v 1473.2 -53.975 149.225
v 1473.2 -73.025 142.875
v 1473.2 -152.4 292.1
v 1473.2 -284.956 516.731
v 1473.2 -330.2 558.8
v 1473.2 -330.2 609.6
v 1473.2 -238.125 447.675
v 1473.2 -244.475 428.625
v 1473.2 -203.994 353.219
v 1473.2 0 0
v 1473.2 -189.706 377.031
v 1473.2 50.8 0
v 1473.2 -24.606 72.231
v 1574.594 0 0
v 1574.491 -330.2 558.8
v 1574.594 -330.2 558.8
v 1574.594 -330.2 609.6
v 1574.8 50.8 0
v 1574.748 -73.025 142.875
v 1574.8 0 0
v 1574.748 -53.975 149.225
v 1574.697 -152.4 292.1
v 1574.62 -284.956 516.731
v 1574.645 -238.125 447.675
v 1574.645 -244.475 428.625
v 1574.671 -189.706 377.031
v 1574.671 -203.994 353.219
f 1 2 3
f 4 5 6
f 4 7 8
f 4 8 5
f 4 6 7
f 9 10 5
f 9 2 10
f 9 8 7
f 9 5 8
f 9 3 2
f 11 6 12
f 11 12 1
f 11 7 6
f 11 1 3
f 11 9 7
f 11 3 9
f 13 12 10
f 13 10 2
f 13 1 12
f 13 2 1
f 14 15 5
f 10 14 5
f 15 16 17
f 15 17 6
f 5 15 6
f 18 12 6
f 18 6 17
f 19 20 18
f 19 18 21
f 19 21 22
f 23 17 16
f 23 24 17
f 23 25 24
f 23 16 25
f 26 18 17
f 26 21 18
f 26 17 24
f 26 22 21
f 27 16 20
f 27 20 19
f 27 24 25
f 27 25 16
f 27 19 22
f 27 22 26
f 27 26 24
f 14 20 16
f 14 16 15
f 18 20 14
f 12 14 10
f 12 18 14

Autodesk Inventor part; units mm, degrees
ref_plane "YZ Plane" through (0, 0, 0) normal (1, 0, 0) x (0, 1, 0)
ref_plane "XZ Plane" through (0, 0, 0) normal (0, 1, 0) x (-1, 0, 0)
ref_plane "XY Plane" through (0, 0, 0) normal (0, 0, 1) x (1, 0, 0)
ref_plane "Work Plane1" through (0, 0, 0) normal (0, 0, 1) x (1, 0, 0)
sketch "Sketch1" plane through (0, 0, 0) normal (0, 0, 1) x (1, 0, 0)
  line L0 (1473.2, 0) -> (1473.2, 50.8) projected
  line L1 (0, 50.8) -> (2565.4, 50.8) projected
  line L2 (1574.8, 0) -> (1574.8, 50.8) projected
  line L3 (1574.5938, 0) -> (1473.2, 0) projected
  line L4 (1473.2, 0) -> (1574.8, 0)
  line L5 (1574.8, 0) -> (1574.8, 50.8)
  line L6 (1574.8, 50.8) -> (1473.2, 50.8)
  line L7 (1473.2, 50.8) -> (1473.2, 0)
  point P0 (0, 0)
ref_plane "Work Plane2" through (1524, -330.2, 304.8) normal (0, 1, 0) x (-1, 0, 0)
sketch "Sketch2" plane through (1524, -330.2, 304.8) normal (0, 1, 0) x (-1, 0, 0)
  line L0 (-50.5938, 254) -> (50.8, 254) projected
  line L1 (50.8, 203.2) -> (50.8, 304.8) projected
  line L2 (71.0788, 304.8) -> (-70.8726, 304.8)
  line L3 (-50.5938, 304.8) -> (-50.5938, 254) projected
  line L4 (50.8, 304.8) -> (-50.5938, 304.8)
  line L5 (-50.5938, 304.8) -> (-50.5938, 254)
  line L6 (-50.5938, 254) -> (50.8, 254)
  line L7 (50.8, 254) -> (50.8, 304.8)
  point P0 (1524, -304.8)
loft "Loft1" add profiles "Sketch2", "Sketch1"
properties part number "SideConnectors"
